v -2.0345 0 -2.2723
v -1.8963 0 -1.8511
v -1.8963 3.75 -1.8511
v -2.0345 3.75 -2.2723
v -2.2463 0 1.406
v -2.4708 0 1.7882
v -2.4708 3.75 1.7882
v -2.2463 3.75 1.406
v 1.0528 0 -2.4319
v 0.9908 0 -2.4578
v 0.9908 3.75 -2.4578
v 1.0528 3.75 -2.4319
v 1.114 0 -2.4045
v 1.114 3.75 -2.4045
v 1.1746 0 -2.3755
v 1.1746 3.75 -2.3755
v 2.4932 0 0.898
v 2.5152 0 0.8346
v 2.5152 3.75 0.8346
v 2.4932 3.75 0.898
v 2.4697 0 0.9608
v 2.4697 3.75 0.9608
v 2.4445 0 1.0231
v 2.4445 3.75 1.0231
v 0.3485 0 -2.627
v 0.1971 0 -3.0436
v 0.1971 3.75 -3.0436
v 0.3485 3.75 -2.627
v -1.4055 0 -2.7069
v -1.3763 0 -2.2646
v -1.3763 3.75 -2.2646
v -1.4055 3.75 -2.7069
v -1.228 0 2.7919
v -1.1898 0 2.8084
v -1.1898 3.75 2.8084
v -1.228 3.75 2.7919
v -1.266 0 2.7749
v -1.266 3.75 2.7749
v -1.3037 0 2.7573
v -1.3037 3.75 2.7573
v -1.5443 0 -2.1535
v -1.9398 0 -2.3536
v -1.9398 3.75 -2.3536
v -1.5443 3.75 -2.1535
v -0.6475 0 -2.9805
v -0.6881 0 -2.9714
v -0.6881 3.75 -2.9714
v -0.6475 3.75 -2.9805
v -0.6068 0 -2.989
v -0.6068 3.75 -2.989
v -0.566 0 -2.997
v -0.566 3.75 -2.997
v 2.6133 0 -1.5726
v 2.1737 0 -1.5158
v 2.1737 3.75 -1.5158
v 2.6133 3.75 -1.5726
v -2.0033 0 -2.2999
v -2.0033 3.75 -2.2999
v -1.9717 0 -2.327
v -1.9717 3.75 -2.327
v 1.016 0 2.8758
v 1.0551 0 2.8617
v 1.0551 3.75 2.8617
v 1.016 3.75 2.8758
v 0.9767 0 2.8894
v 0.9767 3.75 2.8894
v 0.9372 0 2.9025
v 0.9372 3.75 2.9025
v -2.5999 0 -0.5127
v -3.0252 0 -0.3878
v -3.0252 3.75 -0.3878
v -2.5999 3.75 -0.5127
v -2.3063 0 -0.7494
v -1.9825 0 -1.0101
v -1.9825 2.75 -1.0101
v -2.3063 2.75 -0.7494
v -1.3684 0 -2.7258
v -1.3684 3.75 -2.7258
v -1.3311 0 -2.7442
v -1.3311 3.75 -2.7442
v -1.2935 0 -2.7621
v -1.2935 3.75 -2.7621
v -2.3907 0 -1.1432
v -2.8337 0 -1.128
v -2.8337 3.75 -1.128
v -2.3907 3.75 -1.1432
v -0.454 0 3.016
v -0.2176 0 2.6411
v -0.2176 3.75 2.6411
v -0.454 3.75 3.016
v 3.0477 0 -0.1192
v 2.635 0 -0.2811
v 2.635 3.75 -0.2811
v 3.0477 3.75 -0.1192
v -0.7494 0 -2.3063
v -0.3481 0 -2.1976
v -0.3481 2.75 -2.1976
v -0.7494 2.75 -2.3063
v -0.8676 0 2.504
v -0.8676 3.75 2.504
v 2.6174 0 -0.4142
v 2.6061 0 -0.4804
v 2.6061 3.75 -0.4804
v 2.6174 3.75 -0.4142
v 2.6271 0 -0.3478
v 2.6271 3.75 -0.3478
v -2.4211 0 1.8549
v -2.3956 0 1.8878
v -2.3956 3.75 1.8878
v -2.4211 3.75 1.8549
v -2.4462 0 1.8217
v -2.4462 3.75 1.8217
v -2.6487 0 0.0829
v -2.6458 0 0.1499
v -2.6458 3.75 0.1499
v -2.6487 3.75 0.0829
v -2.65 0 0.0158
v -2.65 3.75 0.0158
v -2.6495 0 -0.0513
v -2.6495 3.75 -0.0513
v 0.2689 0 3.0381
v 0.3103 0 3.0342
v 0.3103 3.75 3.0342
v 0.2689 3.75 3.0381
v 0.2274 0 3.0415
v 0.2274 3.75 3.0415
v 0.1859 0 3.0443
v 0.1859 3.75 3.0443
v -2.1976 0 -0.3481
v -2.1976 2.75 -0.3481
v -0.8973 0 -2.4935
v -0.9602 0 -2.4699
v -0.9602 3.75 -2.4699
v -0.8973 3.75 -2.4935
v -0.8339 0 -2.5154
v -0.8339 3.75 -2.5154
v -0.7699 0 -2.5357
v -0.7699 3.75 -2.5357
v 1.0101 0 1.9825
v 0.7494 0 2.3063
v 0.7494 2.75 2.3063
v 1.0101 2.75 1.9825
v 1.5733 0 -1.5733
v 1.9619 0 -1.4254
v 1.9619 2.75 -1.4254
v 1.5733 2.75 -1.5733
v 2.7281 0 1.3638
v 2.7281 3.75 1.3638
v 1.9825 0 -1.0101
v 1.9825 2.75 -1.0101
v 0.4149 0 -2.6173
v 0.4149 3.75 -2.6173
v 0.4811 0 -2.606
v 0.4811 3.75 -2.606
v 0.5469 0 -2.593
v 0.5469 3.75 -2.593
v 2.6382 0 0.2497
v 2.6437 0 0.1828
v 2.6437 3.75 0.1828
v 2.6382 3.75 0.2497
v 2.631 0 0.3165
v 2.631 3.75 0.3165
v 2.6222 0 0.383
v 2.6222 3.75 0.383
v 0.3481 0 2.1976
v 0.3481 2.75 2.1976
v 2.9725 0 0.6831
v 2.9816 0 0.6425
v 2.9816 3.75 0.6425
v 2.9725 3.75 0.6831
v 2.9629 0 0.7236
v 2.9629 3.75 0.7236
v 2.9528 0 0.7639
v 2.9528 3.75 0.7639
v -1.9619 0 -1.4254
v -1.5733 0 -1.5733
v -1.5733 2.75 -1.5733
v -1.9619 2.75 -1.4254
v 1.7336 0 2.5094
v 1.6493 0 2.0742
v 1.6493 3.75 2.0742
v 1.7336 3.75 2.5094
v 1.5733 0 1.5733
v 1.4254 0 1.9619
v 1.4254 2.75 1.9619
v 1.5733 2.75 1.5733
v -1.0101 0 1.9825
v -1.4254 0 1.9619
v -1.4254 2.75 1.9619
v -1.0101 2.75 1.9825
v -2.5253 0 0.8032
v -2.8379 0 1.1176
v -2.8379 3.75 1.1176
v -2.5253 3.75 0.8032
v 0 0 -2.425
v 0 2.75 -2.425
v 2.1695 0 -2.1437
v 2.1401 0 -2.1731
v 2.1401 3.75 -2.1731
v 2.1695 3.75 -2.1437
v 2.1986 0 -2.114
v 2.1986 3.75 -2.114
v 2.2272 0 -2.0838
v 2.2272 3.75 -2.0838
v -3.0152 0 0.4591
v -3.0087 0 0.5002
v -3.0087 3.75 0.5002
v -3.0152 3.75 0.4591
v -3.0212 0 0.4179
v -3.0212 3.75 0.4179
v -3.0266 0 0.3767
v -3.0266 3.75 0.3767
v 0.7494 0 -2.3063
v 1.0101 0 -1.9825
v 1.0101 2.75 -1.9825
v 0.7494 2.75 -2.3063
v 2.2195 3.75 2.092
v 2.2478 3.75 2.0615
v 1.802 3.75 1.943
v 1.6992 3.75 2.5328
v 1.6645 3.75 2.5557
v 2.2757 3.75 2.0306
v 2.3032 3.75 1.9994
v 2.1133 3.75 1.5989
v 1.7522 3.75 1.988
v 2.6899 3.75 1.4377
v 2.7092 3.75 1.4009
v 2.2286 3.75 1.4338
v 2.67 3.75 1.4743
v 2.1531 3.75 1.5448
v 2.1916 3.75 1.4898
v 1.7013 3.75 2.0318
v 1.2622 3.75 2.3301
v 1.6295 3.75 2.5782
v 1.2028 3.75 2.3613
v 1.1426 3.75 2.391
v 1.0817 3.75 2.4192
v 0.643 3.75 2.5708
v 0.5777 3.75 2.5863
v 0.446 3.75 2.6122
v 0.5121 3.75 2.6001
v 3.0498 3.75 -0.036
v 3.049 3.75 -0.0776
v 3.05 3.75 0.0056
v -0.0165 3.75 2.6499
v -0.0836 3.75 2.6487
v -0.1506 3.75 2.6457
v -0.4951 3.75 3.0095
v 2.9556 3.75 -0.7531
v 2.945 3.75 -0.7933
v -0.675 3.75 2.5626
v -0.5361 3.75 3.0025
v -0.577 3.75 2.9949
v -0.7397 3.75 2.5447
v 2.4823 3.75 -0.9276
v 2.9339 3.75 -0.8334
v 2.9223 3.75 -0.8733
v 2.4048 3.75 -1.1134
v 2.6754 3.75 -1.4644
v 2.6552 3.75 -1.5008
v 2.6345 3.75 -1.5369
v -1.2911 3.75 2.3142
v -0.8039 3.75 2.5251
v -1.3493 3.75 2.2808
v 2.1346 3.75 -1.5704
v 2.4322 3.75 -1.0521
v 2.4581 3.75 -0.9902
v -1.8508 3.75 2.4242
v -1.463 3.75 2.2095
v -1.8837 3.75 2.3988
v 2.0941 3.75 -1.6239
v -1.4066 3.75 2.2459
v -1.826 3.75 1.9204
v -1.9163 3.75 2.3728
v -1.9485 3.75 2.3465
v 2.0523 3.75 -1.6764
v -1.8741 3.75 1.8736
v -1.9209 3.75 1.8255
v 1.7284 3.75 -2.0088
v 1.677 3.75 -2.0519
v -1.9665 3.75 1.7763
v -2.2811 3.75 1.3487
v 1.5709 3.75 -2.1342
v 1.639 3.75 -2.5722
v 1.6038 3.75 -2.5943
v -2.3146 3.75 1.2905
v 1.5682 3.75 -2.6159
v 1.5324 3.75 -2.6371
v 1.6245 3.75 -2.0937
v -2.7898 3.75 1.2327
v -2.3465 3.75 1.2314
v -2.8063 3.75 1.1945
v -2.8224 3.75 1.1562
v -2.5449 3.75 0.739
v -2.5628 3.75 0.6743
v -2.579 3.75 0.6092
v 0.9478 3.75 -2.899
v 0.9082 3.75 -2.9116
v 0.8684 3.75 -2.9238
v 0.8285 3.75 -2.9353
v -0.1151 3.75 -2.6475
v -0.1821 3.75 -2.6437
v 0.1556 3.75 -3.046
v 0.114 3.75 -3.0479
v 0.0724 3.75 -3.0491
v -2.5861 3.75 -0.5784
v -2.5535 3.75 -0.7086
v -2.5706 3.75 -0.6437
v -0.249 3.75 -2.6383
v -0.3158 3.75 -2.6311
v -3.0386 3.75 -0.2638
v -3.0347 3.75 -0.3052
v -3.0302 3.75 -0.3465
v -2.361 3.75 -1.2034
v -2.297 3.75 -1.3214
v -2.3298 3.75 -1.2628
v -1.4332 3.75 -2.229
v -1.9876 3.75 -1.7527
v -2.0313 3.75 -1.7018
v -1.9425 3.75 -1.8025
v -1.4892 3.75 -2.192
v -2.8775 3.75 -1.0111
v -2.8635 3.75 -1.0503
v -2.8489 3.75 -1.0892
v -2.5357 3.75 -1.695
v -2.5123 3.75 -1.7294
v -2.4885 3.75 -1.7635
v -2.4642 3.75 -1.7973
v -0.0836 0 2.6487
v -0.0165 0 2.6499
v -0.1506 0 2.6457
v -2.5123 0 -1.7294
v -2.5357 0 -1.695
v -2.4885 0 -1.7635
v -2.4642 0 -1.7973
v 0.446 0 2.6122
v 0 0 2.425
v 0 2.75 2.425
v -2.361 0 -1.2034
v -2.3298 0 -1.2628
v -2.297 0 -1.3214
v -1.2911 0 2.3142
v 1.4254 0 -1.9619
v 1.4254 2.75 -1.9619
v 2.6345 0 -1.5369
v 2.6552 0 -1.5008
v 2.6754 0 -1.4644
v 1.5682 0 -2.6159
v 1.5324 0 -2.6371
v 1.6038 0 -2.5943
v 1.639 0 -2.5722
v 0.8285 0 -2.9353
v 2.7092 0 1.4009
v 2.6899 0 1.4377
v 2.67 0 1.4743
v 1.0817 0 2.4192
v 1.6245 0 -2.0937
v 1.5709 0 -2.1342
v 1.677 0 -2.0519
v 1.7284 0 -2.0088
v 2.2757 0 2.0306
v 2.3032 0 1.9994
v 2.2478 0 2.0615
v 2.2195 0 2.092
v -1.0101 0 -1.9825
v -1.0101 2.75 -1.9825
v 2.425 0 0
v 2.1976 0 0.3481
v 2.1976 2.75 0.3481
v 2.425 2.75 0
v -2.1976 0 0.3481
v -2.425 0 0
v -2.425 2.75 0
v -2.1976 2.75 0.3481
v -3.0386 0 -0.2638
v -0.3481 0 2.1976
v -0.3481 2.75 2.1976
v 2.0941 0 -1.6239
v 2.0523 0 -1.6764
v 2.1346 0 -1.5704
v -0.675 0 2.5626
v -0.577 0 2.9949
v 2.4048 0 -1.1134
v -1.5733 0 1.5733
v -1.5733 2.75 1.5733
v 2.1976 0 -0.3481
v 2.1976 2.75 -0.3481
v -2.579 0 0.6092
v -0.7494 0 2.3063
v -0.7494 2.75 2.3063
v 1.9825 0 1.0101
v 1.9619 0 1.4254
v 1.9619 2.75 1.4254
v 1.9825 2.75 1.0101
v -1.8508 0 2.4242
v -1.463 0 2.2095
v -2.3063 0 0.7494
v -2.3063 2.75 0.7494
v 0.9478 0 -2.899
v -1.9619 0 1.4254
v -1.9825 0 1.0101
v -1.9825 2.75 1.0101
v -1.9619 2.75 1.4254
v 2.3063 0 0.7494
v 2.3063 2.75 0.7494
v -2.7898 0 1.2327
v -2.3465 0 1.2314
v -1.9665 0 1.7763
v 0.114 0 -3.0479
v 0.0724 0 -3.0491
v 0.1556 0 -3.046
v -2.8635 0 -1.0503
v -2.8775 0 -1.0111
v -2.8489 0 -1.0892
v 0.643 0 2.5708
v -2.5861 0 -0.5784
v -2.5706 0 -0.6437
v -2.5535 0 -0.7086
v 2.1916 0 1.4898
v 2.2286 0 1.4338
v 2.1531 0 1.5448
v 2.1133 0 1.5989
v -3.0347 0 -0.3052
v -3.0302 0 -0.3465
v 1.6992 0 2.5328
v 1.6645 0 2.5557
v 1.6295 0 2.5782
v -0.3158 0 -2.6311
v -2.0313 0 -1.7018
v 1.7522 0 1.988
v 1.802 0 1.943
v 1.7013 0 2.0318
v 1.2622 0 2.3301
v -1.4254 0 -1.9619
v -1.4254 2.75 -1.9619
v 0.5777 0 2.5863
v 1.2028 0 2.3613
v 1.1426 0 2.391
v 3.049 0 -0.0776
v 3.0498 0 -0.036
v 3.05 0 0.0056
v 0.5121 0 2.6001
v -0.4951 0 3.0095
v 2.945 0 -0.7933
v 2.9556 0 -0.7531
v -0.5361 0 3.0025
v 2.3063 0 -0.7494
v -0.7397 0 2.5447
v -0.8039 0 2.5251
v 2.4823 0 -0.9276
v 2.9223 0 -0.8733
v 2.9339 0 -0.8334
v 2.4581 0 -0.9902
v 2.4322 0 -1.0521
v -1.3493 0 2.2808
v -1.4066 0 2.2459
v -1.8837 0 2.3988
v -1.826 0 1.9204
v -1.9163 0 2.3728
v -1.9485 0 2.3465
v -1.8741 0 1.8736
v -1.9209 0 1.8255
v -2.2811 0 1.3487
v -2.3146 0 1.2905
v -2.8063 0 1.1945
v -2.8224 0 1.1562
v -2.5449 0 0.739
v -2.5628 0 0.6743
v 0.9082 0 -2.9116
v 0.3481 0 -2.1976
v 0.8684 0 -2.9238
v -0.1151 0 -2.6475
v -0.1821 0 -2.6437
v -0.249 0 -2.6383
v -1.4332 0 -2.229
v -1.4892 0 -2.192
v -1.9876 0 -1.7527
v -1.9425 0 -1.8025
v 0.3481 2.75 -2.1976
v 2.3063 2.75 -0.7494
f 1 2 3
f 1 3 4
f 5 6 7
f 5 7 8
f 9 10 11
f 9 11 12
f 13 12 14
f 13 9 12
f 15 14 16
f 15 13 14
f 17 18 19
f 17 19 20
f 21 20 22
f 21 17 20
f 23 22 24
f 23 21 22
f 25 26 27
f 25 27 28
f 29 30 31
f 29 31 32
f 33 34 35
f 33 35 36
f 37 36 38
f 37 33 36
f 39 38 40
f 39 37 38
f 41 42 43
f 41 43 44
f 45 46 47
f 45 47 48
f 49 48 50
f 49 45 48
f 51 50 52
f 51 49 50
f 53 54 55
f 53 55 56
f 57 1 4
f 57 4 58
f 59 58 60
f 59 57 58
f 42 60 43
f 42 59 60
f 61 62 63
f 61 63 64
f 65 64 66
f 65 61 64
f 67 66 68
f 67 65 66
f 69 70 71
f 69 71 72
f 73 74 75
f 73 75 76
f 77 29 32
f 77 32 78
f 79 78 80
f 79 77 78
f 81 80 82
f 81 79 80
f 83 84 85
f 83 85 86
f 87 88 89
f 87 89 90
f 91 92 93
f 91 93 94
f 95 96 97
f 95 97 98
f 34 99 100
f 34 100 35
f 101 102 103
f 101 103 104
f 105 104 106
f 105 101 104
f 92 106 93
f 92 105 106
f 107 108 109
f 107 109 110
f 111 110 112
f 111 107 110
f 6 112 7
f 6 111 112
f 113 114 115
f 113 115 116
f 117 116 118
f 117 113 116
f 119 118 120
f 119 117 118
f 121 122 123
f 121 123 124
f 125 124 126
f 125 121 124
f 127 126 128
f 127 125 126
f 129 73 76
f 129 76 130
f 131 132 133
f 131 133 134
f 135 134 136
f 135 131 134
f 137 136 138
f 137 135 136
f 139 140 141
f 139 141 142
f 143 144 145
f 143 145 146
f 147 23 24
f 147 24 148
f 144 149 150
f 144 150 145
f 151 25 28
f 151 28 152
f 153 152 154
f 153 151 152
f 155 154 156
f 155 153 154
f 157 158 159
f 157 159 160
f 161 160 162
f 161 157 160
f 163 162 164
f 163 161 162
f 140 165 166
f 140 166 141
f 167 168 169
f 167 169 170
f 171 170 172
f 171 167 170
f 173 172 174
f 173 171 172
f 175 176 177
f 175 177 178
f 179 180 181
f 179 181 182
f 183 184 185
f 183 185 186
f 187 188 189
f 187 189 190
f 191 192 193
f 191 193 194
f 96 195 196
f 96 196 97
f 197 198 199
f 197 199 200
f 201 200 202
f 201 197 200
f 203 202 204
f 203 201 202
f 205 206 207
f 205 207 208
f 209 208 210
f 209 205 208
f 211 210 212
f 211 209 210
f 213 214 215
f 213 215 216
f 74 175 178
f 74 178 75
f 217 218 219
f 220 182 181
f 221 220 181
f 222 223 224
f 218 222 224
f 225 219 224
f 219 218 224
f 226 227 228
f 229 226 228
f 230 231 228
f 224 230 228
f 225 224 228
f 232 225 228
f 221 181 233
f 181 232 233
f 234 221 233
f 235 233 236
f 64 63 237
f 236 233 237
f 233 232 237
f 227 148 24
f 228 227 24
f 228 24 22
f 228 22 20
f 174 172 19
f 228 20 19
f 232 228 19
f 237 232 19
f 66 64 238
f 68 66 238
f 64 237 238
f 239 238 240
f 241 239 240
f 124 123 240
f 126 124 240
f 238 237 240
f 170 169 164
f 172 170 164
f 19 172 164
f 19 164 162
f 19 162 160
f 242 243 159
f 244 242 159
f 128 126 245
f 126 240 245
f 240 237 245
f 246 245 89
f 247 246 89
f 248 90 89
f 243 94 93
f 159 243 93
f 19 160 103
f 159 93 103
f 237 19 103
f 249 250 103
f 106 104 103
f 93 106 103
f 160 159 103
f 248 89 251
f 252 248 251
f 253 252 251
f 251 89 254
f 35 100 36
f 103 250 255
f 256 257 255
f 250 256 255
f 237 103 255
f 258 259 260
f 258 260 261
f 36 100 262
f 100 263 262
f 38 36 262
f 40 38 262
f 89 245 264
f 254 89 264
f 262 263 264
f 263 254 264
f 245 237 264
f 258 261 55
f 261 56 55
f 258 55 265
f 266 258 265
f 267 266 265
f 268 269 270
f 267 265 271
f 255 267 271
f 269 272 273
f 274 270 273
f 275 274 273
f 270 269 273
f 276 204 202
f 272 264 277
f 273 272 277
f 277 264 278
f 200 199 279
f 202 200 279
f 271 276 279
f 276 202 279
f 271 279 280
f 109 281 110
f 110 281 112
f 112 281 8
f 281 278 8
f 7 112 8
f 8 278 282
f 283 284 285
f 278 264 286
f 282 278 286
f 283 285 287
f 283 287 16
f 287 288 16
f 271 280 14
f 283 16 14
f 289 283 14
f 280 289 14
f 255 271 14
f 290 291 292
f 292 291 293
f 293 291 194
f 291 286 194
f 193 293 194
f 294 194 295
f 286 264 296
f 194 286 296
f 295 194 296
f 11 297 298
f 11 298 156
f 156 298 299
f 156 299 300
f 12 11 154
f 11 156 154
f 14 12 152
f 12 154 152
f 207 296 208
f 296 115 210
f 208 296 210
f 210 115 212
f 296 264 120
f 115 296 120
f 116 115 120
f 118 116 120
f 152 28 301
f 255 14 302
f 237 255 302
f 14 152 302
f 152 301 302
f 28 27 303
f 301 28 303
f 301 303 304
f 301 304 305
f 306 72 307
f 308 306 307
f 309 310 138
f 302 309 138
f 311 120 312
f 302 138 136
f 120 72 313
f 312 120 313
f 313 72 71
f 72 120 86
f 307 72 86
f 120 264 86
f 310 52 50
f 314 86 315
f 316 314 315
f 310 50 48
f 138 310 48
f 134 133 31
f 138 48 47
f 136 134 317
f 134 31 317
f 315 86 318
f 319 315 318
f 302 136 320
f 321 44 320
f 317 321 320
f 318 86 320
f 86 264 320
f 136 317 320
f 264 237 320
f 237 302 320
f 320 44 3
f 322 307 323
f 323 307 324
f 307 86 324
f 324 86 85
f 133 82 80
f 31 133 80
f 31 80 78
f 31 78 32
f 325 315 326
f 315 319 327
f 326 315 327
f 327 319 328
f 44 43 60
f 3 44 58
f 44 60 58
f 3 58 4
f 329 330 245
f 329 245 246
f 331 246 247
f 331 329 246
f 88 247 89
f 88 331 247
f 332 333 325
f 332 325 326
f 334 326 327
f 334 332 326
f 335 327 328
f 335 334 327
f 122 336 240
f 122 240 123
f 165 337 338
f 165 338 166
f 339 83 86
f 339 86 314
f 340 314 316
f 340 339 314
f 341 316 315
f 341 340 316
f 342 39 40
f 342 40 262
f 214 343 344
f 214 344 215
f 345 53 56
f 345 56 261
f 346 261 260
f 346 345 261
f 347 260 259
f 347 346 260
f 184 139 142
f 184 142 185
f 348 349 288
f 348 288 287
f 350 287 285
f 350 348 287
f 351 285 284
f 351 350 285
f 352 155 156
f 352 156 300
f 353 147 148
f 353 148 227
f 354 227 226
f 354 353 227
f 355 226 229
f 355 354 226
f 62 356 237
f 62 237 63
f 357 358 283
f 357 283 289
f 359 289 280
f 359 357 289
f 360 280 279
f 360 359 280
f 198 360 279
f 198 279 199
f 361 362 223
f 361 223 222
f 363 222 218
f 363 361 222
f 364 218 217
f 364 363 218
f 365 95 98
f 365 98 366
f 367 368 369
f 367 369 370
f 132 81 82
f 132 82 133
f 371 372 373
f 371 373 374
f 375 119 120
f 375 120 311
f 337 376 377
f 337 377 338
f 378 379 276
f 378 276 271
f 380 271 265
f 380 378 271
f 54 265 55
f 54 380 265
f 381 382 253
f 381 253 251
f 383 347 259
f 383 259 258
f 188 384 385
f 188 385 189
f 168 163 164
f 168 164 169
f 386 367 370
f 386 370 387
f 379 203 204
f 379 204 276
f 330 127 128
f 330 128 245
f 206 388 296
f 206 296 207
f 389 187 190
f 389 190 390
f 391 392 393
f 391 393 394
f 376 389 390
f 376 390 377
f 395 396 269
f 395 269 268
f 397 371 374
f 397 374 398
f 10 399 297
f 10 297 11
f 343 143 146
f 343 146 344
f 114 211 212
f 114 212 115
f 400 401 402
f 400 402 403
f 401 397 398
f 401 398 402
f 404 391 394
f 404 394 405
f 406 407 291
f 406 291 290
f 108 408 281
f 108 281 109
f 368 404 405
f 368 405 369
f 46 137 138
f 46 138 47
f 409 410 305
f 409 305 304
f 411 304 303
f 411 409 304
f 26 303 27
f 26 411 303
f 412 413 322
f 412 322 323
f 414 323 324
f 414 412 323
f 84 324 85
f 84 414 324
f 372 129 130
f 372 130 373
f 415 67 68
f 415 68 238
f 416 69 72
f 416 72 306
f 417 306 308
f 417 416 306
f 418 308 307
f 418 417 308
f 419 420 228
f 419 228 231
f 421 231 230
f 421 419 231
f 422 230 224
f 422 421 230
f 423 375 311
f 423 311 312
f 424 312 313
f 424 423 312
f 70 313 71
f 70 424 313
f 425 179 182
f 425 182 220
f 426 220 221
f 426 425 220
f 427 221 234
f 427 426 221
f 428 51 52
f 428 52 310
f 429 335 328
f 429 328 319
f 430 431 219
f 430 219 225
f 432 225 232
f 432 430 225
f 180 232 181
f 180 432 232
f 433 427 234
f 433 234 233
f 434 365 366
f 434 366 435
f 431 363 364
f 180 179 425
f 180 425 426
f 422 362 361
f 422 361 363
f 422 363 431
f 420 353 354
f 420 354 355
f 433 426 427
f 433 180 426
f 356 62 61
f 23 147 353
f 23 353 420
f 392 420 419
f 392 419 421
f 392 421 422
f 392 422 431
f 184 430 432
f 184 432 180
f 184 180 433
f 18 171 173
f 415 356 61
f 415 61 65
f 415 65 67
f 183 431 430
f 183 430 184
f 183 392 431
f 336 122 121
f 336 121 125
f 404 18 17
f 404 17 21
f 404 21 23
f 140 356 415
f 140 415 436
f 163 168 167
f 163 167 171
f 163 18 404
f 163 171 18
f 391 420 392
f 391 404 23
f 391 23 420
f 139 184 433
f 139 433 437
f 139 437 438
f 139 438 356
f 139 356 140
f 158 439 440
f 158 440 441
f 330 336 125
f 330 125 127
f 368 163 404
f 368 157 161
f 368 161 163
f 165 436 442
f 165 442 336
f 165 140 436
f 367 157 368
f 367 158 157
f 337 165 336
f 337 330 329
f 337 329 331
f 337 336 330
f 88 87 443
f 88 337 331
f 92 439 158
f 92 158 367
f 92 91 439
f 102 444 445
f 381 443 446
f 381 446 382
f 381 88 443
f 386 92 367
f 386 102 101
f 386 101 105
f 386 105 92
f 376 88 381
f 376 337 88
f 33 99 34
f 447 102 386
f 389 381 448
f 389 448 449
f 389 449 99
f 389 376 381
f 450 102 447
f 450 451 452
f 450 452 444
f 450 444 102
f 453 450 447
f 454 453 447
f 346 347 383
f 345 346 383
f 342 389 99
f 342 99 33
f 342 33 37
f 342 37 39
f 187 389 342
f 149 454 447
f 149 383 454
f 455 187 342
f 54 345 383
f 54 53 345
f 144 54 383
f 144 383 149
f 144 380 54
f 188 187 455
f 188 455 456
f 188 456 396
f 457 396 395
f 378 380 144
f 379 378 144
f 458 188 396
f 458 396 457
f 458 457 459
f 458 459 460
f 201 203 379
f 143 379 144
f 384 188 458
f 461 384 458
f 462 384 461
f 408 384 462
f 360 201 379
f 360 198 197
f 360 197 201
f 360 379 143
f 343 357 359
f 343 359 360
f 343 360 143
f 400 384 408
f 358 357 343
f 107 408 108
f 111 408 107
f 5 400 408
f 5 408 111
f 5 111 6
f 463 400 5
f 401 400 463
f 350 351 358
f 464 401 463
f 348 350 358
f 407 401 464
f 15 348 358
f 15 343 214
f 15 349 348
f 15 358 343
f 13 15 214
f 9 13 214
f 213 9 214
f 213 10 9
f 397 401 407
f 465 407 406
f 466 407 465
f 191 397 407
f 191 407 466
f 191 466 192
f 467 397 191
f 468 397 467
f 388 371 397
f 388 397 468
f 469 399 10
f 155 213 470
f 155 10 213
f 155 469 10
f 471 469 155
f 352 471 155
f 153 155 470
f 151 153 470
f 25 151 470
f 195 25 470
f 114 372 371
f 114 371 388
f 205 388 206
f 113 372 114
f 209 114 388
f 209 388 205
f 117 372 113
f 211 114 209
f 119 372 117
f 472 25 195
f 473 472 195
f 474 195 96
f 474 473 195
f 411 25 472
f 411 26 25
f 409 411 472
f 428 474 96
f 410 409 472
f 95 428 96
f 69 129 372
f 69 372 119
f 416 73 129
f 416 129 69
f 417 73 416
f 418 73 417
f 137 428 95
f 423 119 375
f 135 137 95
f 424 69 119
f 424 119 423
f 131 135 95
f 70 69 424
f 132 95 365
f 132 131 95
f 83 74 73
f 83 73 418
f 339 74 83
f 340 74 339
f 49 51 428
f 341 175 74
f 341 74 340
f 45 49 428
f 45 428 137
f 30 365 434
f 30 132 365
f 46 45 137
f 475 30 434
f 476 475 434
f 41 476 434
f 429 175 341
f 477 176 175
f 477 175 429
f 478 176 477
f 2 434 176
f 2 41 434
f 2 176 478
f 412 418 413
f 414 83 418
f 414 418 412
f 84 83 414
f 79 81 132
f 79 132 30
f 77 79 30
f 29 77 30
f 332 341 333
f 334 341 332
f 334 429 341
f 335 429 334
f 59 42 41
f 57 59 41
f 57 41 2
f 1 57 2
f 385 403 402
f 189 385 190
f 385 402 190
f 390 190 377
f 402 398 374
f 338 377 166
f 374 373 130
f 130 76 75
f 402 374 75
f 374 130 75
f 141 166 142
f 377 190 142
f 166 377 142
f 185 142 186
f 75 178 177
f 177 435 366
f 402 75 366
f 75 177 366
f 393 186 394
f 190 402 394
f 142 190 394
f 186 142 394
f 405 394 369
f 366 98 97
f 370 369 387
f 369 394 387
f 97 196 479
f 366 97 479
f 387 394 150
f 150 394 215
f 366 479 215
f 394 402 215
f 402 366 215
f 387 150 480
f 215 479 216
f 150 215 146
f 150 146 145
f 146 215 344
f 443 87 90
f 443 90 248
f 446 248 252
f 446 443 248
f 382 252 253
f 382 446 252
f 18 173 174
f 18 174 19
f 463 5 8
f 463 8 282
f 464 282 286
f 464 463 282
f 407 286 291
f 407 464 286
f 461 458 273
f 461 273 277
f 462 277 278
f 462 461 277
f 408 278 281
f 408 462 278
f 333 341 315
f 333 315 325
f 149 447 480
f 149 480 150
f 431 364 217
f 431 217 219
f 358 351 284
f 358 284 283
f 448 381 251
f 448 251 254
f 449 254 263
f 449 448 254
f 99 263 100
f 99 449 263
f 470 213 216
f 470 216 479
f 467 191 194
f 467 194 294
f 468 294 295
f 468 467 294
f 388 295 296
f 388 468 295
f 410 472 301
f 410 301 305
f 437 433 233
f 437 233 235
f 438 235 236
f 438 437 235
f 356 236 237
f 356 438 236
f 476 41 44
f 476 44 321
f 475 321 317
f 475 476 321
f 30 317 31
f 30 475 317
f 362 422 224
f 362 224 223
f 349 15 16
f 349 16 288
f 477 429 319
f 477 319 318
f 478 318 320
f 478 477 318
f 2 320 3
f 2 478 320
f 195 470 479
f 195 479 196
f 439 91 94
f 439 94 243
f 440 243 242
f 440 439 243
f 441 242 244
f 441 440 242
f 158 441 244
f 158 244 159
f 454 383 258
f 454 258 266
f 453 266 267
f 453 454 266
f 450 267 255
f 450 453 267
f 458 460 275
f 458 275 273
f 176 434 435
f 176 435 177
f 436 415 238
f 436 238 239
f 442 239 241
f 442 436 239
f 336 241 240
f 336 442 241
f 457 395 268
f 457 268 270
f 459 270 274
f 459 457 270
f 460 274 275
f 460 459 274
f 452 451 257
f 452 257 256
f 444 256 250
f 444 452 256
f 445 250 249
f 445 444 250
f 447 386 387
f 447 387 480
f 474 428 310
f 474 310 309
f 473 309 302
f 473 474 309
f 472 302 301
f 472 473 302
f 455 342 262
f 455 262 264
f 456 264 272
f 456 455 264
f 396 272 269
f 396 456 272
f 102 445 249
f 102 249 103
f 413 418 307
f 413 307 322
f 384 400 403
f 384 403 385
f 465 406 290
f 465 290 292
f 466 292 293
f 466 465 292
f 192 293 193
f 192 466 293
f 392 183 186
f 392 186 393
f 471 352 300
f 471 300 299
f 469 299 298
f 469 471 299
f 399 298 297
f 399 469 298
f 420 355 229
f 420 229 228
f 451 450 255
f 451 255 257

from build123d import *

# Parameters (mm, degrees)
SKETCH1_R           = 2.65
BOSS_EXTRUDE1_DEPTH = 3.75
CUT_EXTRUDE1_DEPTH  = 2.75
BOSS_EXTRUDE2_START = -3.75
BOSS_EXTRUDE2_DEPTH = 3.75


with BuildPart() as part:
    # Sketch1 → Boss-Extrude1 (new body)
    with BuildSketch(Plane(origin=(0, 0, 0), x_dir=(1, 0, 0), z_dir=(0, 1, 0))):
        with Locations(Location((0, 0, 0), (0, 0, 270))):
            Circle(SKETCH1_R)
    extrude(amount=BOSS_EXTRUDE1_DEPTH)

    # Sketch2 → Cut-Extrude1 (cut)
    with BuildSketch(Plane(origin=(0, 0, 0), x_dir=(-1, 0, 0), z_dir=(0, -1, 0))):
        Polygon((-0.749366211, 2.306312052), (-0.348066685, 2.197606558), (0, 2.425), (0.348066685, 2.197606558), (0.749366211, 2.306312052), (1.010128862, 1.982489516), (1.425379237, 1.961866211), (1.573312588, 1.573312588), (1.961866211, 1.425379237), (1.982489516, 1.010128862), (2.306312052, 0.749366211), (2.197606558, 0.348066685), (2.425, 0), (2.197606558, -0.348066685), (2.306312052, -0.749366211), (1.982489516, -1.010128862), (1.961866211, -1.425379237), (1.573312588, -1.573312588), (1.425379237, -1.961866211), (1.010128862, -1.982489516), (0.749366211, -2.306312052), (0.348066685, -2.197606558), (0, -2.425), (-0.348066685, -2.197606558), (-0.749366211, -2.306312052), (-1.010128862, -1.982489516), (-1.425379237, -1.961866211), (-1.573312588, -1.573312588), (-1.961866211, -1.425379237), (-1.982489516, -1.010128862), (-2.306312052, -0.749366211), (-2.197606558, -0.348066685), (-2.425, 0), (-2.197606558, 0.348066685), (-2.306312052, 0.749366211), (-1.982489516, 1.010128862), (-1.961866211, 1.425379237), (-1.573312588, 1.573312588), (-1.425379237, 1.961866211), (-1.010128862, 1.982489516), align=None)
    extrude(amount=-CUT_EXTRUDE1_DEPTH, mode=Mode.SUBTRACT)

    # Sketch3 → Boss-Extrude2 (add)
    with BuildSketch(Plane(origin=(0, 3.75, 0), x_dir=(1, 0, 0), z_dir=(0, 1, 0)).offset(BOSS_EXTRUDE2_START)):
        with BuildLine():
            Line((-2.649502742, 0.051334382), (-3.038574166, 0.26375564))
            ThreePointArc((-3.038574166, 0.26375564), (-3.03254237, 0.325863125), (-3.02524125, 0.387834215))
            Line((-3.02524125, 0.387834215), (-2.599921696, 0.512744745))
            ThreePointArc((-2.599921696, 0.512744745), (-2.578570239, 0.611126438), (-2.5534974, 0.708626156))
            Line((-2.5534974, 0.708626156), (-2.877518411, 1.011131938))
            ThreePointArc((-2.877518411, 1.011131938), (-2.856230611, 1.069788155), (-2.833747286, 1.127996595))
            Line((-2.833747286, 1.127996595), (-2.390725942, 1.143210159))
            ThreePointArc((-2.390725942, 1.143210159), (-2.345578748, 1.233191119), (-2.297046425, 1.321392342))
            Line((-2.297046425, 1.321392342), (-2.535657591, 1.694975097))
            ThreePointArc((-2.535657591, 1.694975097), (-2.500451378, 1.746494462), (-2.464198558, 1.7972828))
            Line((-2.464198558, 1.7972828), (-2.031312085, 1.701843475))
            ThreePointArc((-2.031312085, 1.701843475), (-1.965205918, 1.777769866), (-1.896263575, 1.851130588))
            Line((-1.896263575, 1.851130588), (-2.034472079, 2.272316738))
            ThreePointArc((-2.034472079, 2.272316738), (-1.98755959, 2.313462098), (-1.939815172, 2.353639118))
            Line((-1.939815172, 2.353639118), (-1.544263419, 2.153543706))
            ThreePointArc((-1.544263419, 2.153543706), (-1.461351973, 2.210644795), (-1.376331511, 2.264555491))
            Line((-1.376331511, 2.264555491), (-1.405453205, 2.706880361))
            ThreePointArc((-1.405453205, 2.706880361), (-1.349782122, 2.735066402), (-1.293546065, 2.762107633))
            Line((-1.293546065, 2.762107633), (-0.960183003, 2.469928866))
            ThreePointArc((-0.960183003, 2.469928866), (-0.865675909, 2.504616781), (-0.769919476, 2.535690044))
            Line((-0.769919476, 2.535690044), (-0.688124536, 2.971360736))
            ThreePointArc((-0.688124536, 2.971360736), (-0.62719288, 2.984816425), (-0.565998701, 2.997022768))
            Line((-0.565998701, 2.997022768), (-0.315770757, 2.631119311))
            ThreePointArc((-0.315770757, 2.631119311), (-0.215606244, 2.641214483), (-0.115130569, 2.647497866))
            Line((-0.115130569, 2.647497866), (0.072441528, 3.049139588))
            ThreePointArc((0.072441528, 3.049139588), (0.134805198, 3.047019455), (0.197112443, 3.043623939))
            Line((0.197112443, 3.043623939), (0.348482526, 2.626986854))
            ThreePointArc((0.348482526, 2.626986854), (0.448010755, 2.611854966), (0.546892416, 2.592953661))
            Line((0.546892416, 2.592953661), (0.828455824, 2.935329785))
            ThreePointArc((0.828455824, 2.935329785), (0.888332969, 2.917767046), (0.947838287, 2.898983025))
            Line((0.947838287, 2.898983025), (0.990839371, 2.457791151))
            ThreePointArc((0.990839371, 2.457791151), (1.08347759, 2.418382995), (1.174552138, 2.37548464))
            Line((1.174552138, 2.37548464), (1.532415194, 2.637082417))
            ThreePointArc((1.532415194, 2.637082417), (1.586043513, 2.605180603), (1.639007966, 2.572188346))
            Line((1.639007966, 2.572188346), (1.570938134, 2.134163391))
            ThreePointArc((1.570938134, 2.134163391), (1.650865543, 2.072955127), (1.72841043, 2.008755183))
            Line((1.72841043, 2.008755183), (2.140087281, 2.173137462))
            ThreePointArc((2.140087281, 2.173137462), (2.184097109, 2.128901082), (2.227192746, 2.083773613))
            Line((2.227192746, 2.083773613), (2.052329077, 1.676438296))
            ThreePointArc((2.052329077, 1.676438296), (2.114523543, 1.597275864), (2.173666338, 1.515808251))
            Line((2.173666338, 1.515808251), (2.613289814, 1.572646288))
            ThreePointArc((2.613289814, 1.572646288), (2.644915852, 1.518854876), (2.675434815, 1.464427721))
            Line((2.675434815, 1.464427721), (2.404764636, 1.113376418))
            ThreePointArc((2.404764636, 1.113376418), (2.445318252, 1.021233884), (2.482342795, 0.927617511))
            Line((2.482342795, 0.927617511), (2.922289737, 0.873339964))
            ThreePointArc((2.922289737, 0.873339964), (2.939544805, 0.813373432), (2.955569475, 0.753066449))
            Line((2.955569475, 0.753066449), (2.606099988, 0.480357004))
            ThreePointArc((2.606099988, 0.480357004), (2.622464622, 0.381024024), (2.635044526, 0.281141151))
            Line((2.635044526, 0.281141151), (3.047671448, 0.119158478))
            ThreePointArc((3.047671448, 0.119158478), (3.049471346, 0.056784744), (3.049994836, -0.005612758))
            Line((3.049994836, -0.005612758), (2.643684494, -0.182845006))
            ThreePointArc((2.643684494, -0.182845006), (2.634831895, -0.283126977), (2.622176718, -0.383000341))
            Line((2.622176718, -0.383000341), (2.981556754, -0.642510173))
            ThreePointArc((2.981556754, -0.642510173), (2.967788388, -0.703371938), (2.952777803, -0.763939294))
            Line((2.952777803, -0.763939294), (2.51515658, -0.834558193))
            ThreePointArc((2.51515658, -0.834558193), (2.48164299, -0.929488069), (2.444547903, -1.023076513))
            Line((2.444547903, -1.023076513), (2.728099883, -1.363807547))
            ThreePointArc((2.728099883, -1.363807547), (2.699628371, -1.419333175), (2.670026882, -1.474264715))
            Line((2.670026882, -1.474264715), (2.228592128, -1.433833019))
            ThreePointArc((2.228592128, -1.433833019), (2.172523329, -1.517446008), (2.113319153, -1.598869025))
            Line((2.113319153, -1.598869025), (2.303226464, -1.999411878))
            ThreePointArc((2.303226464, -1.999411878), (2.261840774, -2.046112488), (2.219508352, -2.091956662))
            Line((2.219508352, -2.091956662), (1.801997037, -1.943014843))
            ThreePointArc((1.801997037, -1.943014843), (1.726896037, -2.010057232), (1.649302788, -2.074198716))
            Line((1.649302788, -2.074198716), (1.733632855, -2.509385806))
            ThreePointArc((1.733632855, -2.509385806), (1.681933403, -2.544327028), (1.629529949, -2.578203278))
            Line((1.629529949, -2.578203278), (1.262175844, -2.330109898))
            ThreePointArc((1.262175844, -2.330109898), (1.172761516, -2.376369169), (1.081654663, -2.419198873))
            Line((1.081654663, -2.419198873), (1.055108718, -2.861685796))
            ThreePointArc((1.055108718, -2.861685796), (0.996343971, -2.882672144), (0.937162187, -2.902451901))
            Line((0.937162187, -2.902451901), (0.643047502, -2.570795579))
            ThreePointArc((0.643047502, -2.570795579), (0.544938076, -2.593365091), (0.446042198, -2.612191868))
            Line((0.446042198, -2.612191868), (0.31028822, -3.034175542))
            ThreePointArc((0.31028822, -3.034175542), (0.248150583, -3.039888368), (0.185909078, -3.044328795))
            Line((0.185909078, -3.044328795), (-0.016485881, -2.649948719))
            ThreePointArc((-0.016485881, -2.649948719), (-0.117125827, -2.647410346), (-0.217596739, -2.641051241))
            Line((-0.217596739, -2.641051241), (-0.454028829, -3.01601688))
            ThreePointArc((-0.454028829, -3.01601688), (-0.515635019, -3.006097225), (-0.577025382, -2.994919316))
            Line((-0.577025382, -2.994919316), (-0.674983394, -2.562595836))
            ThreePointArc((-0.674983394, -2.562595836), (-0.771830284, -2.535109073), (-0.867563272, -2.503963652))
            Line((-0.867563272, -2.503963652), (-1.189817576, -2.808350786))
            ThreePointArc((-1.189817576, -2.808350786), (-1.247021377, -2.783421938), (-1.303703216, -2.757328041))
            Line((-1.303703216, -2.757328041), (-1.291069219, -2.314225631))
            ThreePointArc((-1.291069219, -2.314225631), (-1.378037806, -2.263517573), (-1.463017615, -2.209542817))
            Line((-1.463017615, -2.209542817), (-1.850845709, -2.424225683))
            ThreePointArc((-1.850845709, -2.424225683), (-1.900052795, -2.385854014), (-1.948464581, -2.346483705))
            Line((-1.948464581, -2.346483705), (-1.826032417, -1.920444119))
            ThreePointArc((-1.826032417, -1.920444119), (-1.897658144, -1.84970094), (-1.96654518, -1.776288281))
            Line((-1.96654518, -1.776288281), (-2.395578399, -1.887777565))
            ThreePointArc((-2.395578399, -1.887777565), (-2.433696908, -1.838374108), (-2.470796751, -1.788201167))
            Line((-2.470796751, -1.788201167), (-2.246259282, -1.40599404))
            ThreePointArc((-2.246259282, -1.40599404), (-2.298041642, -1.319660794), (-2.346507479, -1.231423019))
            Line((-2.346507479, -1.231423019), (-2.789788088, -1.23271344))
            ThreePointArc((-2.789788088, -1.23271344), (-2.814422894, -1.175382395), (-2.837879674, -1.117559374))
            Line((-2.837879674, -1.117559374), (-2.525345415, -0.803200184))
            ThreePointArc((-2.525345415, -0.803200184), (-2.554030732, -0.706701507), (-2.579030083, -0.60918292))
            Line((-2.579030083, -0.60918292), (-3.008705131, -0.500193395))
            ThreePointArc((-3.008705131, -0.500193395), (-3.018308338, -0.438537084), (-3.02664818, -0.376697215))
            Line((-3.02664818, -0.376697215), (-2.645754808, -0.149938307))
            ThreePointArc((-2.645754808, -0.149938307), (-2.649540678, -0.049337565), (-2.649502742, 0.051334382))
        make_face()
        Polygon((0.749366211, 2.306312052), (0.348066685, 2.197606558), (0, 2.425), (-0.348066685, 2.197606558), (-0.749366211, 2.306312052), (-1.010128862, 1.982489516), (-1.425379237, 1.961866211), (-1.573312588, 1.573312588), (-1.961866211, 1.425379237), (-1.982489516, 1.010128862), (-2.306312052, 0.749366211), (-2.197606558, 0.348066685), (-2.425, 0), (-2.197606558, -0.348066685), (-2.306312052, -0.749366211), (-1.982489516, -1.010128862), (-1.961866211, -1.425379237), (-1.573312588, -1.573312588), (-1.425379237, -1.961866211), (-1.010128862, -1.982489516), (-0.749366211, -2.306312052), (-0.348066685, -2.197606558), (0, -2.425), (0.348066685, -2.197606558), (0.749366211, -2.306312052), (1.010128862, -1.982489516), (1.425379237, -1.961866211), (1.573312588, -1.573312588), (1.961866211, -1.425379237), (1.982489516, -1.010128862), (2.306312052, -0.749366211), (2.197606558, -0.348066685), (2.425, 0), (2.197606558, 0.348066685), (2.306312052, 0.749366211), (1.982489516, 1.010128862), (1.961866211, 1.425379237), (1.573312588, 1.573312588), (1.425379237, 1.961866211), (1.010128862, 1.982489516), align=None, mode=Mode.SUBTRACT)
    extrude(amount=BOSS_EXTRUDE2_DEPTH)


solid = part.part
